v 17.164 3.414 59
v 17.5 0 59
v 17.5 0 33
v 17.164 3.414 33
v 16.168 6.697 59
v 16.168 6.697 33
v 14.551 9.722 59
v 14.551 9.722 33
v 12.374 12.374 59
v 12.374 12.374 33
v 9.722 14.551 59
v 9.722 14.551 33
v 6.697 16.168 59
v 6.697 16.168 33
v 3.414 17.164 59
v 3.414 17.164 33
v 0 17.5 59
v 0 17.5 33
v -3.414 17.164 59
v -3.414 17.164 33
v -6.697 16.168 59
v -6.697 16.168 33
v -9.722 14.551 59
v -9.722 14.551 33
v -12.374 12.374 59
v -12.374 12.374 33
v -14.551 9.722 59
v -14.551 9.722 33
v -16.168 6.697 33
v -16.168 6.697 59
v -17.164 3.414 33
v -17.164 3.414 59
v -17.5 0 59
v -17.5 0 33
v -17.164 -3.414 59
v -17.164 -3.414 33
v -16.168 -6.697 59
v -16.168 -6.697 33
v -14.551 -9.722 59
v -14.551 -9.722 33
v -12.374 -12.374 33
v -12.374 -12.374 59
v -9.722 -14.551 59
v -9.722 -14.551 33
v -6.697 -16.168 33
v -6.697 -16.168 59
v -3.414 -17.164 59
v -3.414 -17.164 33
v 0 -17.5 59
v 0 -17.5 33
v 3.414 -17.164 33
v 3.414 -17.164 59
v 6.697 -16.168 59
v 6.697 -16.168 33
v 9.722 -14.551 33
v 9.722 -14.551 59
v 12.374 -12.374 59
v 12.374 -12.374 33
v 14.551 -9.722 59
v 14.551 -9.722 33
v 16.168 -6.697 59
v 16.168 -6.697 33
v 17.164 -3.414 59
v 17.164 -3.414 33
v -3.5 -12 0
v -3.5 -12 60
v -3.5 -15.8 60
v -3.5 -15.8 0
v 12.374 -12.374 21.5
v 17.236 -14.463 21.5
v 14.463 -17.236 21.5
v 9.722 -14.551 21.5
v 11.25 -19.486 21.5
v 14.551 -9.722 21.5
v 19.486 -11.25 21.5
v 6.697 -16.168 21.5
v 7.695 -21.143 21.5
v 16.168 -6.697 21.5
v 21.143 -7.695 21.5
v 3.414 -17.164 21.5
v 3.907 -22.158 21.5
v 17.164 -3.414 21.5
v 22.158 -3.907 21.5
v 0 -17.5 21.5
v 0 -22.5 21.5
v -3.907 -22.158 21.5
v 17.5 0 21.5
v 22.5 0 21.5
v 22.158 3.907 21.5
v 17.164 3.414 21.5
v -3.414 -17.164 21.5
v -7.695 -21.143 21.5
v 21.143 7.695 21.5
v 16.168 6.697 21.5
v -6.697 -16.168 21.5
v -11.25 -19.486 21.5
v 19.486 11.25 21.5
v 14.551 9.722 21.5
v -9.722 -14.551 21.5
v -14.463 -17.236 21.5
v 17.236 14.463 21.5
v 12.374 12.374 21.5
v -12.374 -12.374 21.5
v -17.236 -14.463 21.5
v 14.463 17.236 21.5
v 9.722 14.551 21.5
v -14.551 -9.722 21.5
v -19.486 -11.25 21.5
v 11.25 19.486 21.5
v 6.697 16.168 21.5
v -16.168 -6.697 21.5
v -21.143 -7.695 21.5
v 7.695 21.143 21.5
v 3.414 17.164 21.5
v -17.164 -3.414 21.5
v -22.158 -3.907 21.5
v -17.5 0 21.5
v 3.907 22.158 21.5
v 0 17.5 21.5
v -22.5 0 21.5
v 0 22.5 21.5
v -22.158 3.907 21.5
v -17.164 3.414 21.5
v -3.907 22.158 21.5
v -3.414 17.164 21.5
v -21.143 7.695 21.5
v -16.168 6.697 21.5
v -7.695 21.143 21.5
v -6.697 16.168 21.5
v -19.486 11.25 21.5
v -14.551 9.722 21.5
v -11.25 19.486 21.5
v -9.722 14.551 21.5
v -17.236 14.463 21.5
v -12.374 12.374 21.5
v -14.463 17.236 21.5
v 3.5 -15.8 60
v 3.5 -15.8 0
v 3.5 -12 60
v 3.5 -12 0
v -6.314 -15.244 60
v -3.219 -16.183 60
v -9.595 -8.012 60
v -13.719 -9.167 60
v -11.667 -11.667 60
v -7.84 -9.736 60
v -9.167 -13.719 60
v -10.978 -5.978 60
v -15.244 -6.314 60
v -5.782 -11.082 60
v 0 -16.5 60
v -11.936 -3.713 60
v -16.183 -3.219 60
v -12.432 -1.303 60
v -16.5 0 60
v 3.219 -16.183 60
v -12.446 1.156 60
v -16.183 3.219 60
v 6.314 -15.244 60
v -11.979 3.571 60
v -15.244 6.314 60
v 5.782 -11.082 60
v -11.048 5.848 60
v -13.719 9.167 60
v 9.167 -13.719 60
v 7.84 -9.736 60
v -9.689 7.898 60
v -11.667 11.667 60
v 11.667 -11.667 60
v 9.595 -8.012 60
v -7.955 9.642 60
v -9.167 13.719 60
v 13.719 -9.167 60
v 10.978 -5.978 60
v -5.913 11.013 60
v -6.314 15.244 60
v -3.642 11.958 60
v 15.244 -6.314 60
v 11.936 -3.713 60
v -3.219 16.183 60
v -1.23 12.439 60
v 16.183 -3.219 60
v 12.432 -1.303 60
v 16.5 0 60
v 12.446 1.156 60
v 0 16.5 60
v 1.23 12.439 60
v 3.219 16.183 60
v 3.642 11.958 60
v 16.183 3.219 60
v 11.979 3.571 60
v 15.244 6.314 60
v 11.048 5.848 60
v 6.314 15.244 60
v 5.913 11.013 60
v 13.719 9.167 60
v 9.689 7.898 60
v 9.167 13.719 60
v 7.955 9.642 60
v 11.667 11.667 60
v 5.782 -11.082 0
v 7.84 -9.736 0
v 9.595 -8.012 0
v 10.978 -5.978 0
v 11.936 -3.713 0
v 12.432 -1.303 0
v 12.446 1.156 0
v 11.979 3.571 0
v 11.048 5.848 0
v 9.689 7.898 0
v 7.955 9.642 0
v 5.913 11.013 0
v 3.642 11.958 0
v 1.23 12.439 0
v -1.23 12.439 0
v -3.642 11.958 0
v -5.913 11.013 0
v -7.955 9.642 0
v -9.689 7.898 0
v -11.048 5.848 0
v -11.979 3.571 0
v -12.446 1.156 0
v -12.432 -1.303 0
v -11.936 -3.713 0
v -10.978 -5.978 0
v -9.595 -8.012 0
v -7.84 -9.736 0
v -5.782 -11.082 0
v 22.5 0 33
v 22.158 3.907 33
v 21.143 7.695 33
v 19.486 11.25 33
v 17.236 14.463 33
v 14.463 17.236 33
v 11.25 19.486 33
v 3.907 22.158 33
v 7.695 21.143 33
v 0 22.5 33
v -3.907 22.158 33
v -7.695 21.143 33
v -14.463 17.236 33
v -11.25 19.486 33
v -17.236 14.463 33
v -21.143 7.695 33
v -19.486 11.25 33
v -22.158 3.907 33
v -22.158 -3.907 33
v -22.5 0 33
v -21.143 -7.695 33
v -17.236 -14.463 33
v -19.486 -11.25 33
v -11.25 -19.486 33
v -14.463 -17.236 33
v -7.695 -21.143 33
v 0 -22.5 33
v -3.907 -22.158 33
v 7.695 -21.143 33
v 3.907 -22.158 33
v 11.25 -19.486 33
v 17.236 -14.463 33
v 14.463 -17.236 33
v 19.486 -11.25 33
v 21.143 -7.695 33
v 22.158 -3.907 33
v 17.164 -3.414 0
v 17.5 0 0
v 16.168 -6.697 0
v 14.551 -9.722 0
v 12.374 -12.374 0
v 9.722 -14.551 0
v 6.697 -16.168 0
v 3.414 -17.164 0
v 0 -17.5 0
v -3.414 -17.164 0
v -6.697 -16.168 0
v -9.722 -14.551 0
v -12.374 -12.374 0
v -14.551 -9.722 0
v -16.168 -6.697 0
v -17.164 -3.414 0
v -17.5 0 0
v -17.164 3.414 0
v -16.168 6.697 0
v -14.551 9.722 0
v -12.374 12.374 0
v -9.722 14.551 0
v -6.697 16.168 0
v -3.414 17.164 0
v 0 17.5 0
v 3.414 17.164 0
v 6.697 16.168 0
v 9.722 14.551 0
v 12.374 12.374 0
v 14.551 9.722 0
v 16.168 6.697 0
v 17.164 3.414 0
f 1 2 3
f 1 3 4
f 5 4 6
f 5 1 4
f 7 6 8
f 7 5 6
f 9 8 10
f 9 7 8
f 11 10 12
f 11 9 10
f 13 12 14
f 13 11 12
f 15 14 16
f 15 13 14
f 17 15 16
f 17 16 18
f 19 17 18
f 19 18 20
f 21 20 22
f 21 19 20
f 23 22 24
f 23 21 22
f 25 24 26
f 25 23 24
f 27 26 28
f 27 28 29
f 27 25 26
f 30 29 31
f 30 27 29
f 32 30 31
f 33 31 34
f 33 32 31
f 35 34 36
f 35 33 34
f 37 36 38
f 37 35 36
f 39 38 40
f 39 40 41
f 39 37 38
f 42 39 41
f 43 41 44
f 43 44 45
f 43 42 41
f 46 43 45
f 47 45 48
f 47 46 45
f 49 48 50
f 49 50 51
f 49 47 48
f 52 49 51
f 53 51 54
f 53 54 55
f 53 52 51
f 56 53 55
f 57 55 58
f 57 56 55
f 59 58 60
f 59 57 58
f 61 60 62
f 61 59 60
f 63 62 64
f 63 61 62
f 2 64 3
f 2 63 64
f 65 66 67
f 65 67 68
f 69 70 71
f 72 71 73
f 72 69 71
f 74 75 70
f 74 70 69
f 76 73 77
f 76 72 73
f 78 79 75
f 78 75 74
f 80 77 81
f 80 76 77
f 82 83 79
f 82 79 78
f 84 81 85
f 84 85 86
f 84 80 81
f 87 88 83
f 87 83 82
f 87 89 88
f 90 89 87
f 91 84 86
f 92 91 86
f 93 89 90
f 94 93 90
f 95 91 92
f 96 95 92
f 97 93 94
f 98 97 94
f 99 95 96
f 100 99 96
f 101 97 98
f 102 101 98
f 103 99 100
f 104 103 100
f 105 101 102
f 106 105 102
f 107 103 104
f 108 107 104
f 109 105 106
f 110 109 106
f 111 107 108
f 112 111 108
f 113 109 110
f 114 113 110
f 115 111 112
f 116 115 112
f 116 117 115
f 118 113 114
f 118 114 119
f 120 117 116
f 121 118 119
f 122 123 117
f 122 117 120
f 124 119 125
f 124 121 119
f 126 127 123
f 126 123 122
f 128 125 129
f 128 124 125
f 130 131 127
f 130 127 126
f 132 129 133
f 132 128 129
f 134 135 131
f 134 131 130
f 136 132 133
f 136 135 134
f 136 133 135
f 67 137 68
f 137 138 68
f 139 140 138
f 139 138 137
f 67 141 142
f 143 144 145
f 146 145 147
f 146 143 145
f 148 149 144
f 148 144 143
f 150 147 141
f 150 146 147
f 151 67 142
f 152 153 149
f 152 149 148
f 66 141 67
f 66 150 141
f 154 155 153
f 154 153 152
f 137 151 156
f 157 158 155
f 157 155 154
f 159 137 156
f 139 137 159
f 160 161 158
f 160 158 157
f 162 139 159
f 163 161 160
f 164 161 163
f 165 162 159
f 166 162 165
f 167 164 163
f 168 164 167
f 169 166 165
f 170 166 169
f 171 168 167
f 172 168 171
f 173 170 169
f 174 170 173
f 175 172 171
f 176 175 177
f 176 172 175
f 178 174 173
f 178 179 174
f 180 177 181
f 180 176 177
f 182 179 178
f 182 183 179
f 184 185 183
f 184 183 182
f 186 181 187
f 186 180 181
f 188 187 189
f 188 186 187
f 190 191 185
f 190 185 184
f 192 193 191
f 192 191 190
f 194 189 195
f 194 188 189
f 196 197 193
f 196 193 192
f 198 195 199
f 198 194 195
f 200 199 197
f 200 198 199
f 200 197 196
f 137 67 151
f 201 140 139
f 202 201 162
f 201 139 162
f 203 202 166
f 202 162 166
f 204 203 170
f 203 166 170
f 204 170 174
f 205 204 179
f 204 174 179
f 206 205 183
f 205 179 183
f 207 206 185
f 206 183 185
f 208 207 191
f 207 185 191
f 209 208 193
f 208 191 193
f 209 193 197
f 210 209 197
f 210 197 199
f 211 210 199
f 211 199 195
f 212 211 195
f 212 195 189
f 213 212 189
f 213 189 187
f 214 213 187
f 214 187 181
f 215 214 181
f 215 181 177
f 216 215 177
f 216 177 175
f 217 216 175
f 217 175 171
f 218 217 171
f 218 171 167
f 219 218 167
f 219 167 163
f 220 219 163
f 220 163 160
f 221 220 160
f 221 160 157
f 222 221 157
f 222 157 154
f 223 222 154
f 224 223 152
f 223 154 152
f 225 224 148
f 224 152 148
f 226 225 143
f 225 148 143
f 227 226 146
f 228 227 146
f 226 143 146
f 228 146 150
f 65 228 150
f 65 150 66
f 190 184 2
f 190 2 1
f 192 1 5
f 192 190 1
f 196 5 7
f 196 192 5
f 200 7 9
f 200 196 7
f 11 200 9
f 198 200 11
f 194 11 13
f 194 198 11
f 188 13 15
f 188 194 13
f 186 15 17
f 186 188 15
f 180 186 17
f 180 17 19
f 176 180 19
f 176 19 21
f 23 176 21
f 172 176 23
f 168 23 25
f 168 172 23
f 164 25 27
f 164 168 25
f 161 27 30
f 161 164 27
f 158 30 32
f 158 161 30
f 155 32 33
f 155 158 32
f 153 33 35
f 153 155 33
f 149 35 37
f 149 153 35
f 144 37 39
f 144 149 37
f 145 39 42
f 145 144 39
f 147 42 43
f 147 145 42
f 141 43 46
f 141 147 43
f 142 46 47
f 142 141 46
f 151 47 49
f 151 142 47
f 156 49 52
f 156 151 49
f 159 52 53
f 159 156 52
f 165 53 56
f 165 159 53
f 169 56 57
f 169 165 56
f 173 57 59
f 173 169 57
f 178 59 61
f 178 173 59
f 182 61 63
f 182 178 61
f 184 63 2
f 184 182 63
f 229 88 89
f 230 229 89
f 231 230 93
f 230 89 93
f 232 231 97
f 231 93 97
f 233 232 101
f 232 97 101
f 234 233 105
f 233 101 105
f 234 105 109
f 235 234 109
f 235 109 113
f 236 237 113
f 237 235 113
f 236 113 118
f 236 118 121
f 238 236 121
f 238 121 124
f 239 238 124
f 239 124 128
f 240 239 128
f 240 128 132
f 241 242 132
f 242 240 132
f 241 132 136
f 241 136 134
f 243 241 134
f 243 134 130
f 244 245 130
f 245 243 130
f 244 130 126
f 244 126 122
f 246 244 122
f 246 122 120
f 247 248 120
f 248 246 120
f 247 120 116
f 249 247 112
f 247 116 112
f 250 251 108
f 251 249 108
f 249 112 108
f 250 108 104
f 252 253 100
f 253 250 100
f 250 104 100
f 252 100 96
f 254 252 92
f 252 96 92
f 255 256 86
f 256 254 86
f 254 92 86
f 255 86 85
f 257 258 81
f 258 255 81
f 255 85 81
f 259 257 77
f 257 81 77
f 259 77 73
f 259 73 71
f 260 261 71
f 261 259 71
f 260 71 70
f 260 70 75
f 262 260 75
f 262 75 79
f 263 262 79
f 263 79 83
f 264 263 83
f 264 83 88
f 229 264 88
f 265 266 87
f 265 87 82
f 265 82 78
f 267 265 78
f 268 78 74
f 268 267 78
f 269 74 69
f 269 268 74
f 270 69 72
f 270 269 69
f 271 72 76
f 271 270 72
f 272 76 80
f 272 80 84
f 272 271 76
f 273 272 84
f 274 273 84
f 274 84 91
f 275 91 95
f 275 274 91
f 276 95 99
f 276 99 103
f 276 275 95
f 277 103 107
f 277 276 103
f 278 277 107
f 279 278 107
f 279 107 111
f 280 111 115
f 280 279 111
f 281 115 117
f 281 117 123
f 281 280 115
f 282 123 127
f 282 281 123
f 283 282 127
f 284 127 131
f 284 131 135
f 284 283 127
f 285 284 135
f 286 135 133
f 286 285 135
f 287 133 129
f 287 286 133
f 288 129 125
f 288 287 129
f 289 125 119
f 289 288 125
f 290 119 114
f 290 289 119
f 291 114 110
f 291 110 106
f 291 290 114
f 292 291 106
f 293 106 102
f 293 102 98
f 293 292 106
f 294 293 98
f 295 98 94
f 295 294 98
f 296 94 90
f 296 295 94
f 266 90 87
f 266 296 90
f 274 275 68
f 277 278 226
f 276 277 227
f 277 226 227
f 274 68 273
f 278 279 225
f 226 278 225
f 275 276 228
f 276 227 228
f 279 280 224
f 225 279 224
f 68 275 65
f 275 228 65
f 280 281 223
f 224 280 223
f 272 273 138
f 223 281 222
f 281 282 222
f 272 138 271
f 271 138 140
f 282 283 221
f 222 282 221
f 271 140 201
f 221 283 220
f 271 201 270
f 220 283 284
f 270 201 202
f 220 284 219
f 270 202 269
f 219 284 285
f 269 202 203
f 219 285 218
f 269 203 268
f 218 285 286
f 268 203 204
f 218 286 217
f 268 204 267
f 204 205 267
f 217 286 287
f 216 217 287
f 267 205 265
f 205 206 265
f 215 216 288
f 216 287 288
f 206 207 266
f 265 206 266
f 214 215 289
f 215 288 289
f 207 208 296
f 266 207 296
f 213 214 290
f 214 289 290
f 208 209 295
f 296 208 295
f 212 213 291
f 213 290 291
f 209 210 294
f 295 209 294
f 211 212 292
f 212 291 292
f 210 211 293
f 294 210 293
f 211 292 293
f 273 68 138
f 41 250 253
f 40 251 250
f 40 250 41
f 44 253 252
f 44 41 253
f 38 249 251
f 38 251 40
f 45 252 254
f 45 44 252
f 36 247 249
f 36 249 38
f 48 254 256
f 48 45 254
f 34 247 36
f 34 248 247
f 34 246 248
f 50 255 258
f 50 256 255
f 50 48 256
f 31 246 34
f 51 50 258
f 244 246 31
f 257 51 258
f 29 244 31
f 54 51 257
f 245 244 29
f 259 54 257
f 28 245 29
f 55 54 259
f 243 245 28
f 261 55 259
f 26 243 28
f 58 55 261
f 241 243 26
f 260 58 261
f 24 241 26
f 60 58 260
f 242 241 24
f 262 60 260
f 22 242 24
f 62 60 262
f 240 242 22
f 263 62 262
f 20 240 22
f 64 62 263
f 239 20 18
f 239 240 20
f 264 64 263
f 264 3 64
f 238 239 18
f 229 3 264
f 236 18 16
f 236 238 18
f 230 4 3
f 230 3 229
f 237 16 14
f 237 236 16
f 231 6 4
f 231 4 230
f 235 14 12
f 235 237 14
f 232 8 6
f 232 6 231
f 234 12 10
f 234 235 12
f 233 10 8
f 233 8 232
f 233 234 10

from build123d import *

# Parameters (mm, degrees)
ESQUISSE1_R             = 22.5
BOSS_EXTRU_1_DEPTH      = 60
ESQUISSE2_OUTSIDE_W     = 64.492
ESQUISSE2_OUTSIDE_H     = 64.492
ESQUISSE2_OUTSIDE_R     = 17.5
ENL_V_MAT_EXTRU_1_DEPTH = 27
ESQUISSE3_OUTSIDE_W     = 64.492
ESQUISSE3_OUTSIDE_H     = 64.492
ESQUISSE3_OUTSIDE_R     = 17.5
ENL_V_MAT_EXTRU_2_DEPTH = 21.5
ESQUISSE4_R             = 12.5
ENL_V_MAT_EXTRU_3_DEPTH = 61
ENL_V_MAT_EXTRU_4_DEPTH = 15.8
CHANFREIN1_SIZE         = 1


with BuildPart() as part:
    # Esquisse1 → Boss.-Extru.1 (new body)
    with BuildSketch(Plane.XY):
        Circle(ESQUISSE1_R)
    extrude(amount=BOSS_EXTRU_1_DEPTH)

    # Esquisse2 outside → Enlèv. mat.-Extru.1 (cut)
    with BuildSketch(Plane.XY.offset(60)):
        Rectangle(ESQUISSE2_OUTSIDE_W, ESQUISSE2_OUTSIDE_H)
        Circle(ESQUISSE2_OUTSIDE_R, mode=Mode.SUBTRACT)
    extrude(amount=-ENL_V_MAT_EXTRU_1_DEPTH, mode=Mode.SUBTRACT)

    # Esquisse3 outside → Enlèv. mat.-Extru.2 (cut)
    with BuildSketch(Plane(origin=(0, 0, 0), x_dir=(-1, 0, 0), z_dir=(0, 0, -1))):
        Rectangle(ESQUISSE3_OUTSIDE_W, ESQUISSE3_OUTSIDE_H)
        with Locations(Location((0, 0, 0), (0, 0, 180))):  # turned: the seam where the file's is
            Circle(ESQUISSE3_OUTSIDE_R, mode=Mode.SUBTRACT)
    extrude(amount=-ENL_V_MAT_EXTRU_2_DEPTH, mode=Mode.SUBTRACT)

    # Esquisse4 → Enlèv. mat.-Extru.3 (cut, through all)
    with BuildSketch(Plane.XY.offset(60)):
        Circle(ESQUISSE4_R)
    extrude(amount=-ENL_V_MAT_EXTRU_3_DEPTH, mode=Mode.SUBTRACT)

    # Esquisse6 → Enlèv. mat.-Extru.4 (cut)
    with BuildSketch(Plane(origin=(0, 0, 0), x_dir=(1, 0, 0), z_dir=(0, 1, 0))):
        with BuildLine():
            Line((-3.5, -132.654252639), (-3.5, 6.73879401))
            ThreePointArc((-3.5, 6.73879401), (0, 10.23879401), (3.5, 6.73879401))
            Line((3.5, 6.73879401), (3.5, -132.654252639))
            ThreePointArc((3.5, -132.654252639), (0, -136.154252639), (-3.5, -132.654252639))
        make_face()
    extrude(amount=-ENL_V_MAT_EXTRU_4_DEPTH, mode=Mode.SUBTRACT)

    # Chanfrein1
    chanfrein1_edges = [part.edges().sort_by_distance(p)[0] for p in [
        (-17.5, 0, 60),
    ]]
    chamfer(chanfrein1_edges, length=CHANFREIN1_SIZE)


solid = part.part
